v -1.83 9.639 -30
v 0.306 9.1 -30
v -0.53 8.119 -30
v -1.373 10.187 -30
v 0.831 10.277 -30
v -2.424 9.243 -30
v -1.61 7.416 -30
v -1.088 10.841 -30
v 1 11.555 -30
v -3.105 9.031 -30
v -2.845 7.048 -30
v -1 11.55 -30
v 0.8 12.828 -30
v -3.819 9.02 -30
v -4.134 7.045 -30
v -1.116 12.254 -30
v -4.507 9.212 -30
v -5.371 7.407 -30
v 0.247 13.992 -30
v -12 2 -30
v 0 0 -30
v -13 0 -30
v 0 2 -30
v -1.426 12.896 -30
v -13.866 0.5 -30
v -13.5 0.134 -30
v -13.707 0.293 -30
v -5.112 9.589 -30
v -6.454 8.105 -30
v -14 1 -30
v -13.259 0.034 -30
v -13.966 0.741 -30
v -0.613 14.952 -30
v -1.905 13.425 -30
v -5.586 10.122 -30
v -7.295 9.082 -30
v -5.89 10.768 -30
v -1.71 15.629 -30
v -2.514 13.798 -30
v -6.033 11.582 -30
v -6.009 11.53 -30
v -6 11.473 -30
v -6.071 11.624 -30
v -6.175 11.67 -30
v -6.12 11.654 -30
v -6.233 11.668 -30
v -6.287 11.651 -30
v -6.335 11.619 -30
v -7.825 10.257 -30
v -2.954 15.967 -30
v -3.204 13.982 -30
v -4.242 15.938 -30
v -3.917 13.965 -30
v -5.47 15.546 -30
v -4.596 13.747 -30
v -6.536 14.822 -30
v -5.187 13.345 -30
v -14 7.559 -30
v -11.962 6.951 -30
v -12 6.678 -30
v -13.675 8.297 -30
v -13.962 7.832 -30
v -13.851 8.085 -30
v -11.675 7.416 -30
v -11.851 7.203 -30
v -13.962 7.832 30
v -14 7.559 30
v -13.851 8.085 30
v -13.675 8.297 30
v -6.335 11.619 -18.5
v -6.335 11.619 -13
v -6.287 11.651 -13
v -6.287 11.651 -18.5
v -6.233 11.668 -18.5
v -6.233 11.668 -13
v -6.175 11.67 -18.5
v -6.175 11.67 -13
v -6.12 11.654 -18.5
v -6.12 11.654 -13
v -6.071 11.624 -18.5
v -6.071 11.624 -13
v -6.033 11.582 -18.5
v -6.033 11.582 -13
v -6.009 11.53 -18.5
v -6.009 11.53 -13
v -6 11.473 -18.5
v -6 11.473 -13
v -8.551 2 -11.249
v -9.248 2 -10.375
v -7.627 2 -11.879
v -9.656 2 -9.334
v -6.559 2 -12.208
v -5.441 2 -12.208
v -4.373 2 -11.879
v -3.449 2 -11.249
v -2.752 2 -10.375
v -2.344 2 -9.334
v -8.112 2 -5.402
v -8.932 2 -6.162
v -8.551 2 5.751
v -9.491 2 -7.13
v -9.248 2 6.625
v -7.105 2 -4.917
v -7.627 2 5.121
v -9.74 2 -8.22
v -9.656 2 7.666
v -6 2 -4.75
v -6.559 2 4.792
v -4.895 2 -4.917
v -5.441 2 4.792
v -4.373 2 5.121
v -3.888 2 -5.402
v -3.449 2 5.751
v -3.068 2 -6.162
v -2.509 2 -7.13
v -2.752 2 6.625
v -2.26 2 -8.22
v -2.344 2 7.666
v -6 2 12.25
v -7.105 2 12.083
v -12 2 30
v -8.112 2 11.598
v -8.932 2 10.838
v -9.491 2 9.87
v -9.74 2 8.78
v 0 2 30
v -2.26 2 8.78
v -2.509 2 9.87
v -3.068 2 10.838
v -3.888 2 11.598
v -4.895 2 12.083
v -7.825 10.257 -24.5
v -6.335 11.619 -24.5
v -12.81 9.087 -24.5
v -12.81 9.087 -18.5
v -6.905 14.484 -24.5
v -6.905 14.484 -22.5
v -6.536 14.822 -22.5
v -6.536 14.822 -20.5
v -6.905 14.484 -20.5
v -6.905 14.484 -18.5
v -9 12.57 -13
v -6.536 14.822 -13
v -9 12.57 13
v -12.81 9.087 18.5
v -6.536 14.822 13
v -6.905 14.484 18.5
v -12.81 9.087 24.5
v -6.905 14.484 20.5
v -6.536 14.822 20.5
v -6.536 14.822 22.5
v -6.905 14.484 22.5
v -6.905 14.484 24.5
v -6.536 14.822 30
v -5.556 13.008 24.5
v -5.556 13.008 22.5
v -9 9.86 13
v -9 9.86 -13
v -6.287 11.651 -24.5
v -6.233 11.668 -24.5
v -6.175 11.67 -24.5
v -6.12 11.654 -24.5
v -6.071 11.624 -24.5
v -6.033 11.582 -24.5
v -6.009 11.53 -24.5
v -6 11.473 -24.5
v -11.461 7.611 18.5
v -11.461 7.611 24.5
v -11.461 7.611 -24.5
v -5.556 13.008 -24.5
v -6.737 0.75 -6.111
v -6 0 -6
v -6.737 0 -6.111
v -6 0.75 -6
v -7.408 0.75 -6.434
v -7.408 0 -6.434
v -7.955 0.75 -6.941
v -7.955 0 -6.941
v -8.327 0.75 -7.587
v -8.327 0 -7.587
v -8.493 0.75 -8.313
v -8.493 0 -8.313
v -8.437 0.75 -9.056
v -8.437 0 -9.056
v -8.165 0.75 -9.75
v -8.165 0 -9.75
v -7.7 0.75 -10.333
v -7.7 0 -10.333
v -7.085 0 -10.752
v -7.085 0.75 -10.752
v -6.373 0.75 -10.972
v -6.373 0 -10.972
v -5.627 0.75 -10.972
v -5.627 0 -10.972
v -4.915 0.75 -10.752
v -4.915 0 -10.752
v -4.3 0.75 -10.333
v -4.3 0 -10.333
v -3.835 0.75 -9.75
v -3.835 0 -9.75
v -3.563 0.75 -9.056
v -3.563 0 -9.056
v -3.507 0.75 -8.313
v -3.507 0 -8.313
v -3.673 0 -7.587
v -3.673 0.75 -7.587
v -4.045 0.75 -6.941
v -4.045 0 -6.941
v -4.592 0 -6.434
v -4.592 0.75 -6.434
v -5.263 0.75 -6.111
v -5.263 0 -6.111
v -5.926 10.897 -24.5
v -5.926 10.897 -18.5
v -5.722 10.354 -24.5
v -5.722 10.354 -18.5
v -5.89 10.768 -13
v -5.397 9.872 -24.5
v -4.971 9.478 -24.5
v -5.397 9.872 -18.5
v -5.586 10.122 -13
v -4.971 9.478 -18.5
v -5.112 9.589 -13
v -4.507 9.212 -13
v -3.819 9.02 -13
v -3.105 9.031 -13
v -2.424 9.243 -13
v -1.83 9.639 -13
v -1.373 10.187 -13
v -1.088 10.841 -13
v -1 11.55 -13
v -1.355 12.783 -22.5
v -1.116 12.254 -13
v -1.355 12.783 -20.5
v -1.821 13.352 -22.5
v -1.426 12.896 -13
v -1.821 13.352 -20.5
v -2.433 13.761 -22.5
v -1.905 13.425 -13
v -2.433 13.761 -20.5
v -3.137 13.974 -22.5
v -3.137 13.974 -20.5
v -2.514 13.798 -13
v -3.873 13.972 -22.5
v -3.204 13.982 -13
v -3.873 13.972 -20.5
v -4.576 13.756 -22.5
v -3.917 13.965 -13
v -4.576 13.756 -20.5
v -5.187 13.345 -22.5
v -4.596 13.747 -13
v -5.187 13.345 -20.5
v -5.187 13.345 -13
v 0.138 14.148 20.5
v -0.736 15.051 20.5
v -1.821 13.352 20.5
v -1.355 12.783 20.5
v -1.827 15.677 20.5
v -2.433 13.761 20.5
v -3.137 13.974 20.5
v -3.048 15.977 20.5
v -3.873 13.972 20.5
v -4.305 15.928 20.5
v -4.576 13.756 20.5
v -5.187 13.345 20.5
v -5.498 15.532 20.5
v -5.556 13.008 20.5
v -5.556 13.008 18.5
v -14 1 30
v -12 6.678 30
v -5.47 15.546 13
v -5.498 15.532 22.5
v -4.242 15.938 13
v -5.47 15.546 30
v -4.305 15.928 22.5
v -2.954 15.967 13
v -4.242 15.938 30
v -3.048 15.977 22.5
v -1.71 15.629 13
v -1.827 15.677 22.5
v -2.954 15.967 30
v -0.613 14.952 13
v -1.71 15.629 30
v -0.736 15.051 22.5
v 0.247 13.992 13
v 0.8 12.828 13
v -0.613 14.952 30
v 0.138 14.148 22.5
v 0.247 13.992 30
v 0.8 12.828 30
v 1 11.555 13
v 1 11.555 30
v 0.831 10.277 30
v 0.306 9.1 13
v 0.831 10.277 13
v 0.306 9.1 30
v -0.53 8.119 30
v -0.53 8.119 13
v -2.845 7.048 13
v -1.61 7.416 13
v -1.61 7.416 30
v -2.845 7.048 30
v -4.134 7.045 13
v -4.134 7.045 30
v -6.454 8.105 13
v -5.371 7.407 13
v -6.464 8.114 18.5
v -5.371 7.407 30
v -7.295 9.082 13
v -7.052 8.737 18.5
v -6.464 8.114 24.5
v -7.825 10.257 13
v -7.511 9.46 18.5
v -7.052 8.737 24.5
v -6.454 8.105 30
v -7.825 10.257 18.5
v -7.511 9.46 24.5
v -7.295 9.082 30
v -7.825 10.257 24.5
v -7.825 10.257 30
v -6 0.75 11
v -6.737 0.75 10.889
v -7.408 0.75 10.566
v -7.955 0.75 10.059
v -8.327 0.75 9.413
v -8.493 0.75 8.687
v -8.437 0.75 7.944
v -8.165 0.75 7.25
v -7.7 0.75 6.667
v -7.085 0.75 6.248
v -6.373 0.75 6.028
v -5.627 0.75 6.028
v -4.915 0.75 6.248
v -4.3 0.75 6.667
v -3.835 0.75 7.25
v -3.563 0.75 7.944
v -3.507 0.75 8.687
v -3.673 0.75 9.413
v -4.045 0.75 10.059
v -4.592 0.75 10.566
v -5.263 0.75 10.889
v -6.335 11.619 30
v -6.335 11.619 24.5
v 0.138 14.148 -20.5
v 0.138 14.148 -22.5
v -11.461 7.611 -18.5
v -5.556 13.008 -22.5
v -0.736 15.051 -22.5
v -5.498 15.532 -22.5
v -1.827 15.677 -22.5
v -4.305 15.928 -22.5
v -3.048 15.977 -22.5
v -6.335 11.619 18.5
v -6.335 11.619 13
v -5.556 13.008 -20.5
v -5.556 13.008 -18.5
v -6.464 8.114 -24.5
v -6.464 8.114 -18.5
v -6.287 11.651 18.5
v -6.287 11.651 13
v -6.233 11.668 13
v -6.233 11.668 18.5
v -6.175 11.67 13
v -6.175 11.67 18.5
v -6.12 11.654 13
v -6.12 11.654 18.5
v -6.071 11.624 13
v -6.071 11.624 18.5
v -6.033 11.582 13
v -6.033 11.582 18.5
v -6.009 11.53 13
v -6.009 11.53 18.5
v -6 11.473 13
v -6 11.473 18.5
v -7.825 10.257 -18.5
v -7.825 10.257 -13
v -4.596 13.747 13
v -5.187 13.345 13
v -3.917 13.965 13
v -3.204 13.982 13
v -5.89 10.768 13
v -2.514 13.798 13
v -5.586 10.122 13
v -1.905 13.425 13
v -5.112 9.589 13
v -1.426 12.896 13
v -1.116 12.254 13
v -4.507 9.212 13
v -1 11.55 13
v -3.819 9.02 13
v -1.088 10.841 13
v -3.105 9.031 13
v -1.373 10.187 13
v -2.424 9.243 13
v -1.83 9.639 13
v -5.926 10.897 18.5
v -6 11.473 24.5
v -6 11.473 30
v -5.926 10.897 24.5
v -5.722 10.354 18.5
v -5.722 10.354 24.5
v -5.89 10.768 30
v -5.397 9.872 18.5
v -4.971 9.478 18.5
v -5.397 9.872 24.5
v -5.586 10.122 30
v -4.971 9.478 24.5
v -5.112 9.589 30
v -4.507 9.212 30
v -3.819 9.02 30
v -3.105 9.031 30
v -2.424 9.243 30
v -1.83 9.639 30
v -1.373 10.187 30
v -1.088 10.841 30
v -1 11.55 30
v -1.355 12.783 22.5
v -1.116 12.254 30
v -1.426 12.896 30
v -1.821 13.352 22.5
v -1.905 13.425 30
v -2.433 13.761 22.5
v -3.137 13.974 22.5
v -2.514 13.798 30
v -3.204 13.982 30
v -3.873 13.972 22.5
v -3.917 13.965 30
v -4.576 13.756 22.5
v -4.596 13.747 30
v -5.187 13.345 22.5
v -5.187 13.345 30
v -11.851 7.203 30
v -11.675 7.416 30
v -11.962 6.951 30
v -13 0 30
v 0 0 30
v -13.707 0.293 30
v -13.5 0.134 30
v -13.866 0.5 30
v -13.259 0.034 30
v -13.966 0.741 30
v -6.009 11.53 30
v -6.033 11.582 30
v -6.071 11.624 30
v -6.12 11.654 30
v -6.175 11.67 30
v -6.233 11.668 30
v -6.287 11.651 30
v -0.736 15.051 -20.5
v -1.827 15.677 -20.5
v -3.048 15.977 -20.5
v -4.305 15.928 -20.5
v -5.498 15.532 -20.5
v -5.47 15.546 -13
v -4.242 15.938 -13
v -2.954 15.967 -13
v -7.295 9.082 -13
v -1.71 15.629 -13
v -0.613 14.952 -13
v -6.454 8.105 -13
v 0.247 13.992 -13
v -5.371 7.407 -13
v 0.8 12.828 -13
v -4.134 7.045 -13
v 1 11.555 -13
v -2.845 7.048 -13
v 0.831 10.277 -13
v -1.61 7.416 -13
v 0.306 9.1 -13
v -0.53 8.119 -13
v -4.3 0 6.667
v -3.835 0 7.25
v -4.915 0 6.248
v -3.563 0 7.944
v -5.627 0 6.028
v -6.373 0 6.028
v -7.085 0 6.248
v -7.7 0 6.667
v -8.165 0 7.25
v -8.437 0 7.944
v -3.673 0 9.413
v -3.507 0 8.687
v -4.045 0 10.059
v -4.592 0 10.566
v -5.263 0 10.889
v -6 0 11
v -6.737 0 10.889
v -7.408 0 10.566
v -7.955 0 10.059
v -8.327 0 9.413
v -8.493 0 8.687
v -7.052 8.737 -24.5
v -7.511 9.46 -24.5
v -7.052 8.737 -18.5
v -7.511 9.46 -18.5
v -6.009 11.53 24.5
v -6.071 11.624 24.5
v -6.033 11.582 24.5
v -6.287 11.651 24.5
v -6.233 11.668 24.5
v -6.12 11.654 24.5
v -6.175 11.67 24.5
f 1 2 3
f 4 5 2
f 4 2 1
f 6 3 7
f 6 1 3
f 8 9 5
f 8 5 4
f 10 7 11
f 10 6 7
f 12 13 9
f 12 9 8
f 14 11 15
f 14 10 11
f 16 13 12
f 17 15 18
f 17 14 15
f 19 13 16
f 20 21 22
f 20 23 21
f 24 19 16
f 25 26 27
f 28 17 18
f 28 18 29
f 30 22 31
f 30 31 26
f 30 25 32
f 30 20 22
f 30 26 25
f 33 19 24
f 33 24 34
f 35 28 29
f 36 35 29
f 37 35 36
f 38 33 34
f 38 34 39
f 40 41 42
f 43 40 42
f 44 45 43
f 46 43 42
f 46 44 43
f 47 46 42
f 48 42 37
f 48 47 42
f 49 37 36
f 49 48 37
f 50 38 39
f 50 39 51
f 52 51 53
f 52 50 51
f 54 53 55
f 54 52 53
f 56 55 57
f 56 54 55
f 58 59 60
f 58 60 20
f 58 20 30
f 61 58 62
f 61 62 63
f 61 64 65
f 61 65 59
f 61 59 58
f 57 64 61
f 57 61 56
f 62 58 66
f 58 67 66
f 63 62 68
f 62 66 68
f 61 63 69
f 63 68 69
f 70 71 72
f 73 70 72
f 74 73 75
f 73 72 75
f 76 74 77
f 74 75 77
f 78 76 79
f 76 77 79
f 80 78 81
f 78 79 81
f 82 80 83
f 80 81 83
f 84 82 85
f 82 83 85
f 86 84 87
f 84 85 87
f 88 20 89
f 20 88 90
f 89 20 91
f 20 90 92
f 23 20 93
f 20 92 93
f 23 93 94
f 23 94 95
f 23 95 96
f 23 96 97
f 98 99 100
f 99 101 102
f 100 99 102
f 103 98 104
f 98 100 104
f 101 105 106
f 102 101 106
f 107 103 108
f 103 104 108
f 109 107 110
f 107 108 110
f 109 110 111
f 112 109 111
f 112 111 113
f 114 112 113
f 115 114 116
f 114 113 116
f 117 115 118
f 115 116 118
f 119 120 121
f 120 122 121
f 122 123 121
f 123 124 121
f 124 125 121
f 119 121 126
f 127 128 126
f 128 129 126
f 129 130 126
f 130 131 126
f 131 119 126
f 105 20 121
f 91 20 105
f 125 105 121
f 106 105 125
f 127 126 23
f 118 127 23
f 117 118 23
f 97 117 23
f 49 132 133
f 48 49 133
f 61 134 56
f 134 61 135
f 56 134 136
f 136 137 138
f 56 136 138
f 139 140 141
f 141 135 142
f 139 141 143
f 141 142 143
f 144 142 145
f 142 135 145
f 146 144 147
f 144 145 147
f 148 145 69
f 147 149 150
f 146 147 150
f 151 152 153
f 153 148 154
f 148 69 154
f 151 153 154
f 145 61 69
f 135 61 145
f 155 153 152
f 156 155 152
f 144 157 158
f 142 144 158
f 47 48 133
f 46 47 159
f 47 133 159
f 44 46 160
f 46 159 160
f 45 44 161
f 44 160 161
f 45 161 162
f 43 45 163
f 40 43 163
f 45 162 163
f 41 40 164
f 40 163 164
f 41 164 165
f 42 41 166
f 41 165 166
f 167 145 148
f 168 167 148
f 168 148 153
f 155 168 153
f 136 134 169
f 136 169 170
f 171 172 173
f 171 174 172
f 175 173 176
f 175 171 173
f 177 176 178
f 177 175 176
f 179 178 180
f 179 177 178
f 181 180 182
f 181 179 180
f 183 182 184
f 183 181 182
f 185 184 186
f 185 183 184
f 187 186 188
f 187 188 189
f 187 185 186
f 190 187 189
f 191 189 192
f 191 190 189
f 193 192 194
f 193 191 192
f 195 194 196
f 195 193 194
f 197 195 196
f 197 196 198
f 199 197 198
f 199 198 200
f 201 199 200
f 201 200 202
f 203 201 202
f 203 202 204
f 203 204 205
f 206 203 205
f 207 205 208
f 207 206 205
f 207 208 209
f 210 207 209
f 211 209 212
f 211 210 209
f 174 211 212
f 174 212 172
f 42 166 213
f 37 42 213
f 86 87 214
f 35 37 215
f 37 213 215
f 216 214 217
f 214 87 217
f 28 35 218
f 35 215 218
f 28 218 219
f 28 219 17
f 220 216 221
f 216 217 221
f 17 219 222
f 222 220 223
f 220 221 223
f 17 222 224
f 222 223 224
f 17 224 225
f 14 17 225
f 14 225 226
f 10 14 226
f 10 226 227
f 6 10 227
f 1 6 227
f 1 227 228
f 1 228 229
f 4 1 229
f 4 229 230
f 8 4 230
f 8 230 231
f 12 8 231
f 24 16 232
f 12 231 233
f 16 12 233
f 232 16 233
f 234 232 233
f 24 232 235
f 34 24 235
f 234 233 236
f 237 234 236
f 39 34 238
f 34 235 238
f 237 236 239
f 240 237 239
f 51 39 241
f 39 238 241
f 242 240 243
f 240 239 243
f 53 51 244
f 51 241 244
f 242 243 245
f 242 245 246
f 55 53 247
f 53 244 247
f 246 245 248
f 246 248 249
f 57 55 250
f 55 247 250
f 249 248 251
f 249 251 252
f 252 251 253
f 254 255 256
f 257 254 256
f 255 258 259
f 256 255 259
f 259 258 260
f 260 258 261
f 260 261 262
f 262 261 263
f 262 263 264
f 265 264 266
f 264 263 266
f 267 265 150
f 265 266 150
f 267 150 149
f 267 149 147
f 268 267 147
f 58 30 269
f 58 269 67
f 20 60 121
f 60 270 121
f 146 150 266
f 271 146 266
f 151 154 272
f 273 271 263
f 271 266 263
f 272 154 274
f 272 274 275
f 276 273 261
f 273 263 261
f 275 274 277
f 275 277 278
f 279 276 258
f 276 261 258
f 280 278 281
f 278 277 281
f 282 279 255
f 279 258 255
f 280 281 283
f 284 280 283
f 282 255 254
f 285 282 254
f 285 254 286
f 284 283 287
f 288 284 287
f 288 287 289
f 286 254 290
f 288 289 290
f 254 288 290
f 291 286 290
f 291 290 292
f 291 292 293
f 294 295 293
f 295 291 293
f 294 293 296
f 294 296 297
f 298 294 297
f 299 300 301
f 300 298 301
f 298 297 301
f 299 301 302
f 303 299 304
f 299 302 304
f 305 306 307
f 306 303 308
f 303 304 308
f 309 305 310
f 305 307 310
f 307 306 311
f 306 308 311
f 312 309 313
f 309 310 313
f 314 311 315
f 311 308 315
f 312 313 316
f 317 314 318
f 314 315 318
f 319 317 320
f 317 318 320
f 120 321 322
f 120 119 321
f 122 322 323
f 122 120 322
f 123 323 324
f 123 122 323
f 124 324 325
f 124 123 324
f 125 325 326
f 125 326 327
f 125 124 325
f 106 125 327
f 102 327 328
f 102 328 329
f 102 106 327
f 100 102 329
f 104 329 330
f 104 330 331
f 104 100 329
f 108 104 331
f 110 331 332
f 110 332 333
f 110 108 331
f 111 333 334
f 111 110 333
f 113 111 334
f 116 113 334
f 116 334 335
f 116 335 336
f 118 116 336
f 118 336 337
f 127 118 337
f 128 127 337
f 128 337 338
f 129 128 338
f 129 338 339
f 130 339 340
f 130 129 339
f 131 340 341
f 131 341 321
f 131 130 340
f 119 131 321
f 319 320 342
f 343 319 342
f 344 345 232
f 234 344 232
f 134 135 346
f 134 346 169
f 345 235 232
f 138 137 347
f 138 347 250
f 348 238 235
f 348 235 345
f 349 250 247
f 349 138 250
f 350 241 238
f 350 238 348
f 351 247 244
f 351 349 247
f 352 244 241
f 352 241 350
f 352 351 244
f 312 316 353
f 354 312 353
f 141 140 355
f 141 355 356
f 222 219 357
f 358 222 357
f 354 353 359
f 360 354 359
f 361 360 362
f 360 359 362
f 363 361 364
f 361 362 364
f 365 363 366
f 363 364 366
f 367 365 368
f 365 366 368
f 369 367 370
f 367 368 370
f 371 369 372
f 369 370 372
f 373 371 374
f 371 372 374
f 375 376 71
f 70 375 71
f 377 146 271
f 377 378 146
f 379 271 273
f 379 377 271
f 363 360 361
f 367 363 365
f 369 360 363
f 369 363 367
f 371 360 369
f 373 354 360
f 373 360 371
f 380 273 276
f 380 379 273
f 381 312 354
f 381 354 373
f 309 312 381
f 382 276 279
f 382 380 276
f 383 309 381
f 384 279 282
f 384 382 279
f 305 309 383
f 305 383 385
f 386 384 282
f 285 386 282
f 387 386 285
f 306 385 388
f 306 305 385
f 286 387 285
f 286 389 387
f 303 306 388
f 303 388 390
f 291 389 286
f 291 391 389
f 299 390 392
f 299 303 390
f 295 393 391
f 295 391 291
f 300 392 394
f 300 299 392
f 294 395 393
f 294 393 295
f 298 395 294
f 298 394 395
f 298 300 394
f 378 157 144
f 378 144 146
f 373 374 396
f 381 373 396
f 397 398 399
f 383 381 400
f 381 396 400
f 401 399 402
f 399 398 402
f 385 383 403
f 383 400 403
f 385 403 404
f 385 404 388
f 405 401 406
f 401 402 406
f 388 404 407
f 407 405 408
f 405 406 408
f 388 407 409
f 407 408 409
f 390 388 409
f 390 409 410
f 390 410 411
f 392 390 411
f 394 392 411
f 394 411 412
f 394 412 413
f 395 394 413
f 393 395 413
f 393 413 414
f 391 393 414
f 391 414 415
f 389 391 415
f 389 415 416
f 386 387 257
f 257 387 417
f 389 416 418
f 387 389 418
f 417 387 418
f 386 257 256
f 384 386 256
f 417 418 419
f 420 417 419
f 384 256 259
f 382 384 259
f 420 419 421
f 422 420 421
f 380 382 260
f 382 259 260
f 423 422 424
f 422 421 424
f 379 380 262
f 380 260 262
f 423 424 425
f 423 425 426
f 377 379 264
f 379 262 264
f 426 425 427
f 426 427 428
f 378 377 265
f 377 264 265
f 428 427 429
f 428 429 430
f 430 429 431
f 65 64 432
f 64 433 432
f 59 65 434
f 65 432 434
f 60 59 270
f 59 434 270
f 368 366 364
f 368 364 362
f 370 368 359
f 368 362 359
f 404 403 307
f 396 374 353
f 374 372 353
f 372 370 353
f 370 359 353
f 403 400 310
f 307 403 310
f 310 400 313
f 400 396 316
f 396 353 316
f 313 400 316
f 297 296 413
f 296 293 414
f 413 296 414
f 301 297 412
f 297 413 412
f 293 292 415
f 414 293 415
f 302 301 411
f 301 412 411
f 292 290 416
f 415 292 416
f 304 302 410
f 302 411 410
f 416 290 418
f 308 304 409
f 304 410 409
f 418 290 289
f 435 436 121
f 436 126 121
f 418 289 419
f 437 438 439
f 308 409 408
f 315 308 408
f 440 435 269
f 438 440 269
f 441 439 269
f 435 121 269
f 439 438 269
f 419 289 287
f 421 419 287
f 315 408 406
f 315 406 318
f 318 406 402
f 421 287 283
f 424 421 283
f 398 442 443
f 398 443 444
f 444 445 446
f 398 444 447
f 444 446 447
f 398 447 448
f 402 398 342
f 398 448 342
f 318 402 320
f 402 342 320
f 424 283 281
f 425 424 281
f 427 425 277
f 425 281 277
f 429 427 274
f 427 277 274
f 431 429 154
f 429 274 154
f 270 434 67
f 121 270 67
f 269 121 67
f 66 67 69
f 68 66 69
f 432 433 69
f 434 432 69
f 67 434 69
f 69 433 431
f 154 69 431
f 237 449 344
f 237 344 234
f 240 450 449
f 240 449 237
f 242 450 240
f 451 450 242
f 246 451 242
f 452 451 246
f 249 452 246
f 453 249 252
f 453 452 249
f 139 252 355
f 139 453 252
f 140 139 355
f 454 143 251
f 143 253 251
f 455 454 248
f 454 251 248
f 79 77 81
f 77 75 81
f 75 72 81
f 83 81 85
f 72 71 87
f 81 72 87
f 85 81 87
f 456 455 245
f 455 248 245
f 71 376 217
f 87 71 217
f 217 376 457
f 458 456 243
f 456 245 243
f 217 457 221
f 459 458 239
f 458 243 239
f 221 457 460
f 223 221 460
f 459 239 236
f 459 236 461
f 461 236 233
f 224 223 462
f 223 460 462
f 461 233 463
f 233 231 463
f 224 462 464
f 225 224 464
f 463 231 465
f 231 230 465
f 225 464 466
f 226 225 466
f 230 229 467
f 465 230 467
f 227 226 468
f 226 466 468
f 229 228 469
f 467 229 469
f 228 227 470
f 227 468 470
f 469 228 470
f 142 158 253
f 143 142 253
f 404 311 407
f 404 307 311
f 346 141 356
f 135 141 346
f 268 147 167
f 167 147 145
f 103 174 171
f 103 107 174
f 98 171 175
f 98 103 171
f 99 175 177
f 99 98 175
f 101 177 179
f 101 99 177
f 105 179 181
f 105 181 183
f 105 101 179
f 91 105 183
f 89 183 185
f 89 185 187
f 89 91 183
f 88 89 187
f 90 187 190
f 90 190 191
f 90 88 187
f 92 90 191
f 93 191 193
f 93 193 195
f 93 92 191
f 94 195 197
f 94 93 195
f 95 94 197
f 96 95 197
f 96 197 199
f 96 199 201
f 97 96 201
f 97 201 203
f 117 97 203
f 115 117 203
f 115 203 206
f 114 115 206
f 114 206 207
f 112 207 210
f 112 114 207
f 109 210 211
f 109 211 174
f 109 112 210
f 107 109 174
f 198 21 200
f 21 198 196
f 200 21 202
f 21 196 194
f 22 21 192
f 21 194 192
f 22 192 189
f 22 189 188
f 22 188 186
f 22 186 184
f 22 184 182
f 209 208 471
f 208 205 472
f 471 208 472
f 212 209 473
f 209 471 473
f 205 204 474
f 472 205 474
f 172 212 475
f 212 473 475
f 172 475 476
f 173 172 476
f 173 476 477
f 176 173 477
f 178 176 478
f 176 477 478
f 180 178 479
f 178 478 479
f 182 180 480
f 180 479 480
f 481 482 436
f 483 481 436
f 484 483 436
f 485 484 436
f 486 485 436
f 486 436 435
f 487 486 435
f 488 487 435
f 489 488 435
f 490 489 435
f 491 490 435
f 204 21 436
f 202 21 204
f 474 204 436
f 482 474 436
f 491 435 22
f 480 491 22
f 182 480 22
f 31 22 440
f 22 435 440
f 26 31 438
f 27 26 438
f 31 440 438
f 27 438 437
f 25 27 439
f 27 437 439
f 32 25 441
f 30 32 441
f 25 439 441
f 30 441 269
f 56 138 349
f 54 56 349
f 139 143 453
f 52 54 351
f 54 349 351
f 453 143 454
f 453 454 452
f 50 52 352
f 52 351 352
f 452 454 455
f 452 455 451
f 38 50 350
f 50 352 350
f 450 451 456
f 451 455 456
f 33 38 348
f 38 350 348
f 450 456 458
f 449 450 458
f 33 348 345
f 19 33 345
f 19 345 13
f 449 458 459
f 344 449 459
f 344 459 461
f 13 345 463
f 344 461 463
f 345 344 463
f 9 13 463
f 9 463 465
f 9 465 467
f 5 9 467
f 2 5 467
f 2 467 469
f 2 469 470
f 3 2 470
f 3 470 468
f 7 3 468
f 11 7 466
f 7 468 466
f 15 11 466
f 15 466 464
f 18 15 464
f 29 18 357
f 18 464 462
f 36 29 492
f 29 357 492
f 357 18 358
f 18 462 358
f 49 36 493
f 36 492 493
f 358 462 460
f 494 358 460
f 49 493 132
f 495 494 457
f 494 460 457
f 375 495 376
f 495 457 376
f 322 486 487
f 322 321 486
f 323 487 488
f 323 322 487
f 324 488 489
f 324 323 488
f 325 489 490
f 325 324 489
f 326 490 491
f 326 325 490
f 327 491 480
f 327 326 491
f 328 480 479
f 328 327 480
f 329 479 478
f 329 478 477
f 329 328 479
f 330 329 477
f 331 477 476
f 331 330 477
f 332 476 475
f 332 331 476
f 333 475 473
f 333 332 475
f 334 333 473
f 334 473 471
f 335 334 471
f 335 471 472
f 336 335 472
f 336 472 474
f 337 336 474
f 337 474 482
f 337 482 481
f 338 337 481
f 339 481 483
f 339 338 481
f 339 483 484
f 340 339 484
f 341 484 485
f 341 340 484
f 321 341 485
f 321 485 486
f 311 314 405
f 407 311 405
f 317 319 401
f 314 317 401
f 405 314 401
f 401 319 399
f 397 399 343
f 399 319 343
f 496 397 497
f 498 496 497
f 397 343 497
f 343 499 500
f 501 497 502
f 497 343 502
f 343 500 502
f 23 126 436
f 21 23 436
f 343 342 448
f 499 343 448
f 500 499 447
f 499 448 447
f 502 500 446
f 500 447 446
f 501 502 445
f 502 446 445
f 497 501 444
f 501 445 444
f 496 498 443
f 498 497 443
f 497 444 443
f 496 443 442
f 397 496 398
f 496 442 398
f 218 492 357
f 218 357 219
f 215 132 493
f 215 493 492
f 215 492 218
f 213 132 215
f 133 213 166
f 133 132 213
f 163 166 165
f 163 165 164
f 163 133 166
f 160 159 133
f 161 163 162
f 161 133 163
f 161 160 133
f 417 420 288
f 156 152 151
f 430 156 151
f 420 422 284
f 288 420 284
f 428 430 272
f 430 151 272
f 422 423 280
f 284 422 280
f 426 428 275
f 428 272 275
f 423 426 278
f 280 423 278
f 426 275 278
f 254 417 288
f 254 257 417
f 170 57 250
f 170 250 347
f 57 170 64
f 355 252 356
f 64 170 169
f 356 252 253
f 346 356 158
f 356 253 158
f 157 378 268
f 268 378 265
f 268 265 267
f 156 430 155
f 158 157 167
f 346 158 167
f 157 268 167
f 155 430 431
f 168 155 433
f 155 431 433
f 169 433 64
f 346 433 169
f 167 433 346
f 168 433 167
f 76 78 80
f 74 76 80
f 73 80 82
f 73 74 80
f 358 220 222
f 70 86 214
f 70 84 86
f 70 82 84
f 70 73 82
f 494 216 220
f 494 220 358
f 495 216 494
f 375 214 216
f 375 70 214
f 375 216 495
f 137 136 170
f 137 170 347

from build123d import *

# Parameters (mm, degrees)
EXTRUDE_1_DEPTH          = 30
CUT_EXTRUDE_1_REACH      = 37.944
SKETCH_2_W               = 10
SKETCH_2_H               = 26
HOLE_WIZARD_1_AT_2_COUNT = 2
HOLE_WIZARD_1_AT_2_PITCH = 17
CUT_EXTRUDE_2_DEPTH      = 5


with BuildPart() as part:
    # 草图1 → 凸台-拉伸1 (new, symmetric)
    with BuildSketch(Plane.XY):
        with BuildLine():
            Line((0, 0), (-13, 0))
            ThreePointArc((-13, 0), (-13.707106781, 0.292893219), (-14, 1))
            Line((-14, 1), (-14, 7.559208386))
            ThreePointArc((-14, 7.559208386), (-13.915047807, 7.962553786), (-13.674624977, 8.297369033))
            Line((-13.674624977, 8.297369033), (-6.535812398, 14.821722909))
            ThreePointArc((-6.535812398, 14.821722909), (0.830646134, 10.277091966), (-7.82487065, 10.256821067))
            Line((-7.82487065, 10.256821067), (-6.3347696, 11.618664715))
            ThreePointArc((-6.3347696, 11.618664715), (-6.120158424, 11.654472256), (-5.999856115, 11.47317832))
            ThreePointArc((-5.999856115, 11.47317832), (-1.20700412, 10.503922746), (-5.186562443, 13.345401616))
            Line((-5.186562443, 13.345401616), (-11.674624977, 7.415785805))
            ThreePointArc((-11.674624977, 7.415785805), (-11.915047807, 7.080970558), (-12, 6.677625158))
            Line((-12, 6.677625158), (-12, 2))
            Line((-12, 2), (0, 2))
            Line((0, 2), (0, 0))
        make_face()
    extrude(amount=EXTRUDE_1_DEPTH, both=True)

    # 草图2 → 切除-拉伸1 (cut, up to next)
    with BuildSketch(Plane(origin=(0, 2, 0), x_dir=(1, 0, 0), z_dir=(0, 1, 0)), mode=Mode.PRIVATE) as cut_extrude_1_sk1:
        with Locations((-4, 0)):
            Rectangle(SKETCH_2_W, SKETCH_2_H)
    cut_extrude_1_tool1 = extrude(cut_extrude_1_sk1.sketch, amount=CUT_EXTRUDE_1_REACH, mode=Mode.PRIVATE) & part.part
    add(cut_extrude_1_tool1.solids().sort_by_distance((-4, 2, 0))[0], mode=Mode.SUBTRACT)

    # 草图3 → 打孔尺寸(%根据十字)槽沉头木螺钉的类型1 (revolve, cut)
    with BuildSketch(Plane(origin=(-6, 2, -8.5), x_dir=(0, 0, 1), z_dir=(1, 0, 0))):
        Polygon((0, 0), (0, 2), (2.5, 2), (2.5, 1.25), (3.75, 0), align=None)
    hole_wizard_1 = revolve(axis=Axis((-6, 8.35, -8.5), (0, -1, 0)), mode=Mode.SUBTRACT)

    # 打孔尺寸(%根据十字)槽沉头木螺钉的类型1 at 2: 打孔尺寸(%根据十字)槽沉头木螺钉的类型1 ×2
    with Locations(*[(0, 0, i * HOLE_WIZARD_1_AT_2_PITCH) for i in range(1, HOLE_WIZARD_1_AT_2_COUNT)]):
        add(hole_wizard_1, mode=Mode.SUBTRACT)

    # 草图5 → 切除-拉伸2 (cut)
    with BuildSketch(Plane(origin=(-10.355516916, 11.330791651, 0), x_dir=(0.7381606464067151, 0.6746249773736669, 0), z_dir=(-0.6746249773736669, 0.7381606464067151, 0))):
        Polygon((-3.325375023, 24.5), (4.674624977, 24.5), (4.674624977, 22.5), (9.674624977, 22.5), (9.674624977, 20.5), (4.674624977, 20.5), (4.674624977, 18.5), (-3.325375023, 18.5), align=None)
        Polygon((9.674624977, -22.5), (9.674624977, -20.5), (4.674624977, -20.5), (4.674624977, -18.5), (-3.325375023, -18.5), (-3.325375023, -24.5), (4.674624977, -24.5), (4.674624977, -22.5), align=None)
    extrude(amount=-CUT_EXTRUDE_2_DEPTH, mode=Mode.SUBTRACT)


solid = part.part
